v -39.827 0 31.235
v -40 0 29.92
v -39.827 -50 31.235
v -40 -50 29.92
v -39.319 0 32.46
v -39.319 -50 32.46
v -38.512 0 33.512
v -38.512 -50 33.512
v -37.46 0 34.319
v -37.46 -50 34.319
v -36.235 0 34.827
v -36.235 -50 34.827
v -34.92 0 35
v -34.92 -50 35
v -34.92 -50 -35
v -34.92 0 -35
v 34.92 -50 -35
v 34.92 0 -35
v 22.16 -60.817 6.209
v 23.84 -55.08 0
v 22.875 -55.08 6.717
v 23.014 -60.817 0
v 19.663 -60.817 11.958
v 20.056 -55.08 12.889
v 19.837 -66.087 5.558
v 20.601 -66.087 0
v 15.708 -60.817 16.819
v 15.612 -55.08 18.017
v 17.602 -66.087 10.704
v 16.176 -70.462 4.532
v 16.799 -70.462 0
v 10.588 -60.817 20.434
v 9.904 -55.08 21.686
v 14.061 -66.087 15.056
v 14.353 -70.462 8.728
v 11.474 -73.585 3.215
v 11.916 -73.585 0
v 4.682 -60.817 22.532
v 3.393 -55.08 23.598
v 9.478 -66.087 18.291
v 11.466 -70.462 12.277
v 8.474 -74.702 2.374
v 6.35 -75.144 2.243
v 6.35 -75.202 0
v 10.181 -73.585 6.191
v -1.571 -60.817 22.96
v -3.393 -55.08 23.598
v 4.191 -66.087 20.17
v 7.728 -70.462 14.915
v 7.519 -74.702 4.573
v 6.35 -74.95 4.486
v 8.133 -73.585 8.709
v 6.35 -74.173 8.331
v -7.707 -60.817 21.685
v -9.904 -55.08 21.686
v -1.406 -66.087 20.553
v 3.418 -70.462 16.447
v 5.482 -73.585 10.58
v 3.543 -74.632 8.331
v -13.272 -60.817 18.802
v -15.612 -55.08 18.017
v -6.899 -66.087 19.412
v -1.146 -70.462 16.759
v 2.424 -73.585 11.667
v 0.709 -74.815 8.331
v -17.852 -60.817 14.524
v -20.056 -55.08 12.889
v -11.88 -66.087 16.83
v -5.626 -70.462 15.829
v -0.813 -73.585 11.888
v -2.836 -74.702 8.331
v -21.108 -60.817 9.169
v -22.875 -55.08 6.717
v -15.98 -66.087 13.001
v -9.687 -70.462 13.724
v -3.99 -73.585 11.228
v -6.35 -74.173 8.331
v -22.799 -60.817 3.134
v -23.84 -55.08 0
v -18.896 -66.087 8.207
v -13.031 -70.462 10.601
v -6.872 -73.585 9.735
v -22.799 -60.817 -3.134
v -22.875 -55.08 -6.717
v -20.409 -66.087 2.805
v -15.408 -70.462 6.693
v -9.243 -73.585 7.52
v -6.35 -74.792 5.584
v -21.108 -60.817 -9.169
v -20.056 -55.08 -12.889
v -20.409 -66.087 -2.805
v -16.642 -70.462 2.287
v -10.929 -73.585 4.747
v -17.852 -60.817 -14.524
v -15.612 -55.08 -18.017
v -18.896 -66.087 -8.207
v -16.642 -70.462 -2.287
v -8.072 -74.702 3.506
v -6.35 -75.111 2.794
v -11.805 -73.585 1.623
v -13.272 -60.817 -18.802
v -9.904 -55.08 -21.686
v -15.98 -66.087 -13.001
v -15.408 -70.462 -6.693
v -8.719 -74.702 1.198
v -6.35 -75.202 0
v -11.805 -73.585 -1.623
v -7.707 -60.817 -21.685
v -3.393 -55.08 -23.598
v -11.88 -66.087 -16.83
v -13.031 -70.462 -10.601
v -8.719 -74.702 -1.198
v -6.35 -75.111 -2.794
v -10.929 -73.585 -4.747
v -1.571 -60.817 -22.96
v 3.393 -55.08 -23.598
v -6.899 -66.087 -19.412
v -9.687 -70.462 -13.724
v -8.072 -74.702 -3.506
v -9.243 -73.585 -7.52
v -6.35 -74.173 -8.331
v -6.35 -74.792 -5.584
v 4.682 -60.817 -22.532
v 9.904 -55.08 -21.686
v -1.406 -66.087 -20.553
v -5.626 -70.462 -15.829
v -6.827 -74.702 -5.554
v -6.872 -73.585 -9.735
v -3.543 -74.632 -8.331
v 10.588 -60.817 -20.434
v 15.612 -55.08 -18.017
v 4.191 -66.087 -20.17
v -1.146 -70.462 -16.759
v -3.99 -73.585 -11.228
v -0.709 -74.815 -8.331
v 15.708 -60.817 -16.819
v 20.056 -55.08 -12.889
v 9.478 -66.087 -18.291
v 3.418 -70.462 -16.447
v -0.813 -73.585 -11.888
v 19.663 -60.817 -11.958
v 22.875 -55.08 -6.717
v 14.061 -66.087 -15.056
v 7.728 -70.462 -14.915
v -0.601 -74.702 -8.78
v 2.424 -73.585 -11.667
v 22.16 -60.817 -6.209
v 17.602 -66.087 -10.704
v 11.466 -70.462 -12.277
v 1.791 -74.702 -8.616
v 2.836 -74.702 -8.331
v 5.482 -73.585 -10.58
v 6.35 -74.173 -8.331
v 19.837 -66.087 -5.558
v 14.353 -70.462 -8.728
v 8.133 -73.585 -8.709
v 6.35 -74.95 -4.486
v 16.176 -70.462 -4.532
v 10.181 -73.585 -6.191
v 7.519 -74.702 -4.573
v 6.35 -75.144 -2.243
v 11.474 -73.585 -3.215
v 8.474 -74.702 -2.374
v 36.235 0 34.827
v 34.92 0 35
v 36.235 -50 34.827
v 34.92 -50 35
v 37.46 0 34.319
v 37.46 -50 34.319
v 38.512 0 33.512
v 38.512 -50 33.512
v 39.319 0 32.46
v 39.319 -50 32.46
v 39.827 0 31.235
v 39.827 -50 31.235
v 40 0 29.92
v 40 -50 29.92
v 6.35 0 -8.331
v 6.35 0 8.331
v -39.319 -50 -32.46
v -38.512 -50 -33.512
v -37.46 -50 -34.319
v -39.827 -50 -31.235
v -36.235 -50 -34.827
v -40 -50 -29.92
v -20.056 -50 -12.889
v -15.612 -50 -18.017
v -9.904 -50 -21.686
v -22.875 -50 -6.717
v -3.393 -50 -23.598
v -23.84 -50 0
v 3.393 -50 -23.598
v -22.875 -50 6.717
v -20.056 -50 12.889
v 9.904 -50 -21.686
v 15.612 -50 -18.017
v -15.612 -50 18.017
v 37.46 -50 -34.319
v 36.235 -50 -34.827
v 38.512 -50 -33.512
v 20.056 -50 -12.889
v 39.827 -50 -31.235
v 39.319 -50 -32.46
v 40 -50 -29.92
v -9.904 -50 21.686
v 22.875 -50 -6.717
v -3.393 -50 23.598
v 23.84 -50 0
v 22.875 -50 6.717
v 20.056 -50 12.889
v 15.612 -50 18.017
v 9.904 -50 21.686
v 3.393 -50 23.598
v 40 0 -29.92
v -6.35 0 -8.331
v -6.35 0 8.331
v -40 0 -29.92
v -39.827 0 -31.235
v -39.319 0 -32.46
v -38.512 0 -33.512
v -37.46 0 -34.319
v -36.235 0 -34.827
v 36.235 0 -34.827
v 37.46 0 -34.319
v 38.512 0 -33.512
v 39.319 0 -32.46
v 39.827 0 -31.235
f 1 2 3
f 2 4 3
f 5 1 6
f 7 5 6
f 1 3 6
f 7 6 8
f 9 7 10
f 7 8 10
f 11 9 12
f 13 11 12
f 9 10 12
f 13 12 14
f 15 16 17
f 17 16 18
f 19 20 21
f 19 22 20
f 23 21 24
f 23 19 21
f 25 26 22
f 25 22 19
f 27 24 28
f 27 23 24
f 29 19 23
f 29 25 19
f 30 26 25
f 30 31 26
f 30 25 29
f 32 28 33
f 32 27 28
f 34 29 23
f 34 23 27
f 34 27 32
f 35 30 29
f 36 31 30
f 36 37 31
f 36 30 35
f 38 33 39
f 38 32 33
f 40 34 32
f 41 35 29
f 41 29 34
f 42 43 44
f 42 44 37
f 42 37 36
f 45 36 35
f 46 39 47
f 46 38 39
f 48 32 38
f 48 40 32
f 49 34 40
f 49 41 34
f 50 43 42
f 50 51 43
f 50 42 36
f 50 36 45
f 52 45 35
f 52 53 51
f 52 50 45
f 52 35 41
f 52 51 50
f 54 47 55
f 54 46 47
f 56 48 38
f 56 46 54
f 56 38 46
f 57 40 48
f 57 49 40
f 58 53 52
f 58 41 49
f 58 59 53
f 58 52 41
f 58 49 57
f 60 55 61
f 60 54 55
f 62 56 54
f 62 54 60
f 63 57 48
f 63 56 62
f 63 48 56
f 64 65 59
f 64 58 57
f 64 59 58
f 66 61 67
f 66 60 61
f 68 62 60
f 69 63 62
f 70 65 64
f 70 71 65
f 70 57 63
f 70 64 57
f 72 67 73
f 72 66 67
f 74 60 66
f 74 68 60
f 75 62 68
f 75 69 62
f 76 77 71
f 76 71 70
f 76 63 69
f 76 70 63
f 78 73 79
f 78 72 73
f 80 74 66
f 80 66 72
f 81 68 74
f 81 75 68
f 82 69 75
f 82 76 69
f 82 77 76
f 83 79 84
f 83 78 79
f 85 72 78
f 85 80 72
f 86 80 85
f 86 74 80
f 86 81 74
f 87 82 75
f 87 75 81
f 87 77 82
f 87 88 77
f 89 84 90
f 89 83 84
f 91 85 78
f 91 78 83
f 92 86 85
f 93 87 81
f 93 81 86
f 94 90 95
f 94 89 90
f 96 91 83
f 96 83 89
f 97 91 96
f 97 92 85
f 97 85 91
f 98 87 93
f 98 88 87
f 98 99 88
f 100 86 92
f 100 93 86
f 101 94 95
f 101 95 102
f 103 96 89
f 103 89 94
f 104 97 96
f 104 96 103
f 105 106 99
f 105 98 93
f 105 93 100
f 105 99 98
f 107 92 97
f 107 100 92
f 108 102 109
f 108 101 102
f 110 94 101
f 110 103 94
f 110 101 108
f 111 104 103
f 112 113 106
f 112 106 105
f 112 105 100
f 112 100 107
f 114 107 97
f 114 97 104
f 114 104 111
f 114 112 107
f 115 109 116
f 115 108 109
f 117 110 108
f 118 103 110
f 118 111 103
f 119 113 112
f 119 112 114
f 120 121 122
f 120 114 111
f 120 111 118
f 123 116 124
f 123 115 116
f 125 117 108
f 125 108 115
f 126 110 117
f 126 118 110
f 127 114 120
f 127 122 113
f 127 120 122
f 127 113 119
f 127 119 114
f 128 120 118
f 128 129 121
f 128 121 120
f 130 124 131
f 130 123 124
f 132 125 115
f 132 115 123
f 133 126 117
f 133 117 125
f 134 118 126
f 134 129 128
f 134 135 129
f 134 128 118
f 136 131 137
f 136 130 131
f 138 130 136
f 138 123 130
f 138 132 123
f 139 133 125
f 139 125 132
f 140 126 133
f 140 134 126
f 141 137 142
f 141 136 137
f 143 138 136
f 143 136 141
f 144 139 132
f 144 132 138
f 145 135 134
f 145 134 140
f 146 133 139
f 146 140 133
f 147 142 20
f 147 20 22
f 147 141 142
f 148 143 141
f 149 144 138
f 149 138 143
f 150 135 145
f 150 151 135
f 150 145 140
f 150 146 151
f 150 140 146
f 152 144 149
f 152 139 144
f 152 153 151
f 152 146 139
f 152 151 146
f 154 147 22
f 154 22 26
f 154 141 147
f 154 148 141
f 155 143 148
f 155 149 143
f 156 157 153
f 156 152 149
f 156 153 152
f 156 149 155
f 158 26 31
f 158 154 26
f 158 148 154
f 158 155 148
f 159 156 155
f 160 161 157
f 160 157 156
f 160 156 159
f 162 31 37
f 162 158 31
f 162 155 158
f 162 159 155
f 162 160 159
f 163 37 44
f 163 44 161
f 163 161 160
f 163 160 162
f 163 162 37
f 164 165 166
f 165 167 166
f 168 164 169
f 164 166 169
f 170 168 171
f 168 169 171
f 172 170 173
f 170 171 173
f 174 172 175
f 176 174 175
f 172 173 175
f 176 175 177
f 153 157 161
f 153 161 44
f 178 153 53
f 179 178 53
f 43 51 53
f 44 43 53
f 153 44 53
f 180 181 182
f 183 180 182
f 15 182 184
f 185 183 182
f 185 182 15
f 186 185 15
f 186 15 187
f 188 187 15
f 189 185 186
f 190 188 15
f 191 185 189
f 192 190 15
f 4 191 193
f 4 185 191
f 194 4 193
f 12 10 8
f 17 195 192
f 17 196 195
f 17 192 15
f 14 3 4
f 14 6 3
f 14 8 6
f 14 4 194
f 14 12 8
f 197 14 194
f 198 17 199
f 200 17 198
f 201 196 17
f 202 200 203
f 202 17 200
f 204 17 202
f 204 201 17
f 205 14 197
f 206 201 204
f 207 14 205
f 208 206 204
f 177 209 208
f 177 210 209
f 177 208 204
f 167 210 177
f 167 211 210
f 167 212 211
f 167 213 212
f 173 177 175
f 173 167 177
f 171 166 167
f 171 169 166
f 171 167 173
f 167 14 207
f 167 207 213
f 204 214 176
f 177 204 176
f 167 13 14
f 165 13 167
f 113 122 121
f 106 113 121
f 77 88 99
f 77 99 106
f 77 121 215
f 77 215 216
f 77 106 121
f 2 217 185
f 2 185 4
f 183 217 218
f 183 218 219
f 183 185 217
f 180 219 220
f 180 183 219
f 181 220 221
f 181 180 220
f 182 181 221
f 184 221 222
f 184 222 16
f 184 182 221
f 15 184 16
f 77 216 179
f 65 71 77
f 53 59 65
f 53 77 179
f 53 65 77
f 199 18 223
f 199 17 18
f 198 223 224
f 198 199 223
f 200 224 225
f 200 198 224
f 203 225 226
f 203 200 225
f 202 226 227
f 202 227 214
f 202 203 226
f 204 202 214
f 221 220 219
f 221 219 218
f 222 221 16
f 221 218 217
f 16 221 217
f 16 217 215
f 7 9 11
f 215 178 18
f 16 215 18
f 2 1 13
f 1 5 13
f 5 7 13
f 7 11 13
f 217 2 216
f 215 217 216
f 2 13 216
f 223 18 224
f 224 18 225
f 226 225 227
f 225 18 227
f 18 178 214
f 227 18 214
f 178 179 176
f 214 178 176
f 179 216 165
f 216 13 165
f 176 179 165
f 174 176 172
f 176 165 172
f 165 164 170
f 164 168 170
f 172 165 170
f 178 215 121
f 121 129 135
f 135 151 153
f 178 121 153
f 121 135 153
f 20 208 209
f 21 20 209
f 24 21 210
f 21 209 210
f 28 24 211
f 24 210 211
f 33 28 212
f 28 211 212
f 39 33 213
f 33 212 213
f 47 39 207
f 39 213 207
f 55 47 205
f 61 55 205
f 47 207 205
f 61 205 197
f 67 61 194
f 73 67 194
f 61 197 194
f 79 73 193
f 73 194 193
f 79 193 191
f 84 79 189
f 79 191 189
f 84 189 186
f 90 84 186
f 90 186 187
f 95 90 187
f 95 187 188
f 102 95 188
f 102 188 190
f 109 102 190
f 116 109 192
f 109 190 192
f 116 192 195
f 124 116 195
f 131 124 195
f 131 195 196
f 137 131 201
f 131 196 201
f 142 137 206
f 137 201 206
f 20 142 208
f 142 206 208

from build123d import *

# Parameters (mm, degrees)
F0_W     = 80
F0_H     = 70
F1_DEPTH = 50
F2_R     = 23.84042
F3_DEPTH = 25.4
F4_R     = 5.08
F5_R     = 20.32
F6_W     = 12.7
F6_H     = 16.662312
F7_DEPTH = 75.4


with BuildPart() as f1:
    # F0 (on Front) → F1 (new body)
    with BuildSketch(Plane.XZ):
        Rectangle(F0_W, F0_H)
    extrude(amount=F1_DEPTH)

    # F2 (on face) → F3 (join)
    with BuildSketch(Plane.XZ.offset(50)):
        Circle(F2_R)
    extrude(amount=F3_DEPTH)

    # F4
    f4_edges = [f1.edges().sort_by_distance(p)[0] for p in [
        (40, -25, 35),
        (40, -25, -35),
        (-40, -25, 35),
        (-40, -25, -35),
    ]]
    fillet(f4_edges, radius=F4_R)

    # F5
    f5_edges = [f1.edges().sort_by_distance(p)[0] for p in [
        (-23.84042, -75.4, 0),
    ]]
    fillet(f5_edges, radius=F5_R)

    # F6 (on face) → F7 (cut, through all)
    with BuildSketch(Plane.XZ.offset(75.4)):
        Rectangle(F6_W, F6_H)
    extrude(amount=-F7_DEPTH, mode=Mode.SUBTRACT)


solid = f1.part
